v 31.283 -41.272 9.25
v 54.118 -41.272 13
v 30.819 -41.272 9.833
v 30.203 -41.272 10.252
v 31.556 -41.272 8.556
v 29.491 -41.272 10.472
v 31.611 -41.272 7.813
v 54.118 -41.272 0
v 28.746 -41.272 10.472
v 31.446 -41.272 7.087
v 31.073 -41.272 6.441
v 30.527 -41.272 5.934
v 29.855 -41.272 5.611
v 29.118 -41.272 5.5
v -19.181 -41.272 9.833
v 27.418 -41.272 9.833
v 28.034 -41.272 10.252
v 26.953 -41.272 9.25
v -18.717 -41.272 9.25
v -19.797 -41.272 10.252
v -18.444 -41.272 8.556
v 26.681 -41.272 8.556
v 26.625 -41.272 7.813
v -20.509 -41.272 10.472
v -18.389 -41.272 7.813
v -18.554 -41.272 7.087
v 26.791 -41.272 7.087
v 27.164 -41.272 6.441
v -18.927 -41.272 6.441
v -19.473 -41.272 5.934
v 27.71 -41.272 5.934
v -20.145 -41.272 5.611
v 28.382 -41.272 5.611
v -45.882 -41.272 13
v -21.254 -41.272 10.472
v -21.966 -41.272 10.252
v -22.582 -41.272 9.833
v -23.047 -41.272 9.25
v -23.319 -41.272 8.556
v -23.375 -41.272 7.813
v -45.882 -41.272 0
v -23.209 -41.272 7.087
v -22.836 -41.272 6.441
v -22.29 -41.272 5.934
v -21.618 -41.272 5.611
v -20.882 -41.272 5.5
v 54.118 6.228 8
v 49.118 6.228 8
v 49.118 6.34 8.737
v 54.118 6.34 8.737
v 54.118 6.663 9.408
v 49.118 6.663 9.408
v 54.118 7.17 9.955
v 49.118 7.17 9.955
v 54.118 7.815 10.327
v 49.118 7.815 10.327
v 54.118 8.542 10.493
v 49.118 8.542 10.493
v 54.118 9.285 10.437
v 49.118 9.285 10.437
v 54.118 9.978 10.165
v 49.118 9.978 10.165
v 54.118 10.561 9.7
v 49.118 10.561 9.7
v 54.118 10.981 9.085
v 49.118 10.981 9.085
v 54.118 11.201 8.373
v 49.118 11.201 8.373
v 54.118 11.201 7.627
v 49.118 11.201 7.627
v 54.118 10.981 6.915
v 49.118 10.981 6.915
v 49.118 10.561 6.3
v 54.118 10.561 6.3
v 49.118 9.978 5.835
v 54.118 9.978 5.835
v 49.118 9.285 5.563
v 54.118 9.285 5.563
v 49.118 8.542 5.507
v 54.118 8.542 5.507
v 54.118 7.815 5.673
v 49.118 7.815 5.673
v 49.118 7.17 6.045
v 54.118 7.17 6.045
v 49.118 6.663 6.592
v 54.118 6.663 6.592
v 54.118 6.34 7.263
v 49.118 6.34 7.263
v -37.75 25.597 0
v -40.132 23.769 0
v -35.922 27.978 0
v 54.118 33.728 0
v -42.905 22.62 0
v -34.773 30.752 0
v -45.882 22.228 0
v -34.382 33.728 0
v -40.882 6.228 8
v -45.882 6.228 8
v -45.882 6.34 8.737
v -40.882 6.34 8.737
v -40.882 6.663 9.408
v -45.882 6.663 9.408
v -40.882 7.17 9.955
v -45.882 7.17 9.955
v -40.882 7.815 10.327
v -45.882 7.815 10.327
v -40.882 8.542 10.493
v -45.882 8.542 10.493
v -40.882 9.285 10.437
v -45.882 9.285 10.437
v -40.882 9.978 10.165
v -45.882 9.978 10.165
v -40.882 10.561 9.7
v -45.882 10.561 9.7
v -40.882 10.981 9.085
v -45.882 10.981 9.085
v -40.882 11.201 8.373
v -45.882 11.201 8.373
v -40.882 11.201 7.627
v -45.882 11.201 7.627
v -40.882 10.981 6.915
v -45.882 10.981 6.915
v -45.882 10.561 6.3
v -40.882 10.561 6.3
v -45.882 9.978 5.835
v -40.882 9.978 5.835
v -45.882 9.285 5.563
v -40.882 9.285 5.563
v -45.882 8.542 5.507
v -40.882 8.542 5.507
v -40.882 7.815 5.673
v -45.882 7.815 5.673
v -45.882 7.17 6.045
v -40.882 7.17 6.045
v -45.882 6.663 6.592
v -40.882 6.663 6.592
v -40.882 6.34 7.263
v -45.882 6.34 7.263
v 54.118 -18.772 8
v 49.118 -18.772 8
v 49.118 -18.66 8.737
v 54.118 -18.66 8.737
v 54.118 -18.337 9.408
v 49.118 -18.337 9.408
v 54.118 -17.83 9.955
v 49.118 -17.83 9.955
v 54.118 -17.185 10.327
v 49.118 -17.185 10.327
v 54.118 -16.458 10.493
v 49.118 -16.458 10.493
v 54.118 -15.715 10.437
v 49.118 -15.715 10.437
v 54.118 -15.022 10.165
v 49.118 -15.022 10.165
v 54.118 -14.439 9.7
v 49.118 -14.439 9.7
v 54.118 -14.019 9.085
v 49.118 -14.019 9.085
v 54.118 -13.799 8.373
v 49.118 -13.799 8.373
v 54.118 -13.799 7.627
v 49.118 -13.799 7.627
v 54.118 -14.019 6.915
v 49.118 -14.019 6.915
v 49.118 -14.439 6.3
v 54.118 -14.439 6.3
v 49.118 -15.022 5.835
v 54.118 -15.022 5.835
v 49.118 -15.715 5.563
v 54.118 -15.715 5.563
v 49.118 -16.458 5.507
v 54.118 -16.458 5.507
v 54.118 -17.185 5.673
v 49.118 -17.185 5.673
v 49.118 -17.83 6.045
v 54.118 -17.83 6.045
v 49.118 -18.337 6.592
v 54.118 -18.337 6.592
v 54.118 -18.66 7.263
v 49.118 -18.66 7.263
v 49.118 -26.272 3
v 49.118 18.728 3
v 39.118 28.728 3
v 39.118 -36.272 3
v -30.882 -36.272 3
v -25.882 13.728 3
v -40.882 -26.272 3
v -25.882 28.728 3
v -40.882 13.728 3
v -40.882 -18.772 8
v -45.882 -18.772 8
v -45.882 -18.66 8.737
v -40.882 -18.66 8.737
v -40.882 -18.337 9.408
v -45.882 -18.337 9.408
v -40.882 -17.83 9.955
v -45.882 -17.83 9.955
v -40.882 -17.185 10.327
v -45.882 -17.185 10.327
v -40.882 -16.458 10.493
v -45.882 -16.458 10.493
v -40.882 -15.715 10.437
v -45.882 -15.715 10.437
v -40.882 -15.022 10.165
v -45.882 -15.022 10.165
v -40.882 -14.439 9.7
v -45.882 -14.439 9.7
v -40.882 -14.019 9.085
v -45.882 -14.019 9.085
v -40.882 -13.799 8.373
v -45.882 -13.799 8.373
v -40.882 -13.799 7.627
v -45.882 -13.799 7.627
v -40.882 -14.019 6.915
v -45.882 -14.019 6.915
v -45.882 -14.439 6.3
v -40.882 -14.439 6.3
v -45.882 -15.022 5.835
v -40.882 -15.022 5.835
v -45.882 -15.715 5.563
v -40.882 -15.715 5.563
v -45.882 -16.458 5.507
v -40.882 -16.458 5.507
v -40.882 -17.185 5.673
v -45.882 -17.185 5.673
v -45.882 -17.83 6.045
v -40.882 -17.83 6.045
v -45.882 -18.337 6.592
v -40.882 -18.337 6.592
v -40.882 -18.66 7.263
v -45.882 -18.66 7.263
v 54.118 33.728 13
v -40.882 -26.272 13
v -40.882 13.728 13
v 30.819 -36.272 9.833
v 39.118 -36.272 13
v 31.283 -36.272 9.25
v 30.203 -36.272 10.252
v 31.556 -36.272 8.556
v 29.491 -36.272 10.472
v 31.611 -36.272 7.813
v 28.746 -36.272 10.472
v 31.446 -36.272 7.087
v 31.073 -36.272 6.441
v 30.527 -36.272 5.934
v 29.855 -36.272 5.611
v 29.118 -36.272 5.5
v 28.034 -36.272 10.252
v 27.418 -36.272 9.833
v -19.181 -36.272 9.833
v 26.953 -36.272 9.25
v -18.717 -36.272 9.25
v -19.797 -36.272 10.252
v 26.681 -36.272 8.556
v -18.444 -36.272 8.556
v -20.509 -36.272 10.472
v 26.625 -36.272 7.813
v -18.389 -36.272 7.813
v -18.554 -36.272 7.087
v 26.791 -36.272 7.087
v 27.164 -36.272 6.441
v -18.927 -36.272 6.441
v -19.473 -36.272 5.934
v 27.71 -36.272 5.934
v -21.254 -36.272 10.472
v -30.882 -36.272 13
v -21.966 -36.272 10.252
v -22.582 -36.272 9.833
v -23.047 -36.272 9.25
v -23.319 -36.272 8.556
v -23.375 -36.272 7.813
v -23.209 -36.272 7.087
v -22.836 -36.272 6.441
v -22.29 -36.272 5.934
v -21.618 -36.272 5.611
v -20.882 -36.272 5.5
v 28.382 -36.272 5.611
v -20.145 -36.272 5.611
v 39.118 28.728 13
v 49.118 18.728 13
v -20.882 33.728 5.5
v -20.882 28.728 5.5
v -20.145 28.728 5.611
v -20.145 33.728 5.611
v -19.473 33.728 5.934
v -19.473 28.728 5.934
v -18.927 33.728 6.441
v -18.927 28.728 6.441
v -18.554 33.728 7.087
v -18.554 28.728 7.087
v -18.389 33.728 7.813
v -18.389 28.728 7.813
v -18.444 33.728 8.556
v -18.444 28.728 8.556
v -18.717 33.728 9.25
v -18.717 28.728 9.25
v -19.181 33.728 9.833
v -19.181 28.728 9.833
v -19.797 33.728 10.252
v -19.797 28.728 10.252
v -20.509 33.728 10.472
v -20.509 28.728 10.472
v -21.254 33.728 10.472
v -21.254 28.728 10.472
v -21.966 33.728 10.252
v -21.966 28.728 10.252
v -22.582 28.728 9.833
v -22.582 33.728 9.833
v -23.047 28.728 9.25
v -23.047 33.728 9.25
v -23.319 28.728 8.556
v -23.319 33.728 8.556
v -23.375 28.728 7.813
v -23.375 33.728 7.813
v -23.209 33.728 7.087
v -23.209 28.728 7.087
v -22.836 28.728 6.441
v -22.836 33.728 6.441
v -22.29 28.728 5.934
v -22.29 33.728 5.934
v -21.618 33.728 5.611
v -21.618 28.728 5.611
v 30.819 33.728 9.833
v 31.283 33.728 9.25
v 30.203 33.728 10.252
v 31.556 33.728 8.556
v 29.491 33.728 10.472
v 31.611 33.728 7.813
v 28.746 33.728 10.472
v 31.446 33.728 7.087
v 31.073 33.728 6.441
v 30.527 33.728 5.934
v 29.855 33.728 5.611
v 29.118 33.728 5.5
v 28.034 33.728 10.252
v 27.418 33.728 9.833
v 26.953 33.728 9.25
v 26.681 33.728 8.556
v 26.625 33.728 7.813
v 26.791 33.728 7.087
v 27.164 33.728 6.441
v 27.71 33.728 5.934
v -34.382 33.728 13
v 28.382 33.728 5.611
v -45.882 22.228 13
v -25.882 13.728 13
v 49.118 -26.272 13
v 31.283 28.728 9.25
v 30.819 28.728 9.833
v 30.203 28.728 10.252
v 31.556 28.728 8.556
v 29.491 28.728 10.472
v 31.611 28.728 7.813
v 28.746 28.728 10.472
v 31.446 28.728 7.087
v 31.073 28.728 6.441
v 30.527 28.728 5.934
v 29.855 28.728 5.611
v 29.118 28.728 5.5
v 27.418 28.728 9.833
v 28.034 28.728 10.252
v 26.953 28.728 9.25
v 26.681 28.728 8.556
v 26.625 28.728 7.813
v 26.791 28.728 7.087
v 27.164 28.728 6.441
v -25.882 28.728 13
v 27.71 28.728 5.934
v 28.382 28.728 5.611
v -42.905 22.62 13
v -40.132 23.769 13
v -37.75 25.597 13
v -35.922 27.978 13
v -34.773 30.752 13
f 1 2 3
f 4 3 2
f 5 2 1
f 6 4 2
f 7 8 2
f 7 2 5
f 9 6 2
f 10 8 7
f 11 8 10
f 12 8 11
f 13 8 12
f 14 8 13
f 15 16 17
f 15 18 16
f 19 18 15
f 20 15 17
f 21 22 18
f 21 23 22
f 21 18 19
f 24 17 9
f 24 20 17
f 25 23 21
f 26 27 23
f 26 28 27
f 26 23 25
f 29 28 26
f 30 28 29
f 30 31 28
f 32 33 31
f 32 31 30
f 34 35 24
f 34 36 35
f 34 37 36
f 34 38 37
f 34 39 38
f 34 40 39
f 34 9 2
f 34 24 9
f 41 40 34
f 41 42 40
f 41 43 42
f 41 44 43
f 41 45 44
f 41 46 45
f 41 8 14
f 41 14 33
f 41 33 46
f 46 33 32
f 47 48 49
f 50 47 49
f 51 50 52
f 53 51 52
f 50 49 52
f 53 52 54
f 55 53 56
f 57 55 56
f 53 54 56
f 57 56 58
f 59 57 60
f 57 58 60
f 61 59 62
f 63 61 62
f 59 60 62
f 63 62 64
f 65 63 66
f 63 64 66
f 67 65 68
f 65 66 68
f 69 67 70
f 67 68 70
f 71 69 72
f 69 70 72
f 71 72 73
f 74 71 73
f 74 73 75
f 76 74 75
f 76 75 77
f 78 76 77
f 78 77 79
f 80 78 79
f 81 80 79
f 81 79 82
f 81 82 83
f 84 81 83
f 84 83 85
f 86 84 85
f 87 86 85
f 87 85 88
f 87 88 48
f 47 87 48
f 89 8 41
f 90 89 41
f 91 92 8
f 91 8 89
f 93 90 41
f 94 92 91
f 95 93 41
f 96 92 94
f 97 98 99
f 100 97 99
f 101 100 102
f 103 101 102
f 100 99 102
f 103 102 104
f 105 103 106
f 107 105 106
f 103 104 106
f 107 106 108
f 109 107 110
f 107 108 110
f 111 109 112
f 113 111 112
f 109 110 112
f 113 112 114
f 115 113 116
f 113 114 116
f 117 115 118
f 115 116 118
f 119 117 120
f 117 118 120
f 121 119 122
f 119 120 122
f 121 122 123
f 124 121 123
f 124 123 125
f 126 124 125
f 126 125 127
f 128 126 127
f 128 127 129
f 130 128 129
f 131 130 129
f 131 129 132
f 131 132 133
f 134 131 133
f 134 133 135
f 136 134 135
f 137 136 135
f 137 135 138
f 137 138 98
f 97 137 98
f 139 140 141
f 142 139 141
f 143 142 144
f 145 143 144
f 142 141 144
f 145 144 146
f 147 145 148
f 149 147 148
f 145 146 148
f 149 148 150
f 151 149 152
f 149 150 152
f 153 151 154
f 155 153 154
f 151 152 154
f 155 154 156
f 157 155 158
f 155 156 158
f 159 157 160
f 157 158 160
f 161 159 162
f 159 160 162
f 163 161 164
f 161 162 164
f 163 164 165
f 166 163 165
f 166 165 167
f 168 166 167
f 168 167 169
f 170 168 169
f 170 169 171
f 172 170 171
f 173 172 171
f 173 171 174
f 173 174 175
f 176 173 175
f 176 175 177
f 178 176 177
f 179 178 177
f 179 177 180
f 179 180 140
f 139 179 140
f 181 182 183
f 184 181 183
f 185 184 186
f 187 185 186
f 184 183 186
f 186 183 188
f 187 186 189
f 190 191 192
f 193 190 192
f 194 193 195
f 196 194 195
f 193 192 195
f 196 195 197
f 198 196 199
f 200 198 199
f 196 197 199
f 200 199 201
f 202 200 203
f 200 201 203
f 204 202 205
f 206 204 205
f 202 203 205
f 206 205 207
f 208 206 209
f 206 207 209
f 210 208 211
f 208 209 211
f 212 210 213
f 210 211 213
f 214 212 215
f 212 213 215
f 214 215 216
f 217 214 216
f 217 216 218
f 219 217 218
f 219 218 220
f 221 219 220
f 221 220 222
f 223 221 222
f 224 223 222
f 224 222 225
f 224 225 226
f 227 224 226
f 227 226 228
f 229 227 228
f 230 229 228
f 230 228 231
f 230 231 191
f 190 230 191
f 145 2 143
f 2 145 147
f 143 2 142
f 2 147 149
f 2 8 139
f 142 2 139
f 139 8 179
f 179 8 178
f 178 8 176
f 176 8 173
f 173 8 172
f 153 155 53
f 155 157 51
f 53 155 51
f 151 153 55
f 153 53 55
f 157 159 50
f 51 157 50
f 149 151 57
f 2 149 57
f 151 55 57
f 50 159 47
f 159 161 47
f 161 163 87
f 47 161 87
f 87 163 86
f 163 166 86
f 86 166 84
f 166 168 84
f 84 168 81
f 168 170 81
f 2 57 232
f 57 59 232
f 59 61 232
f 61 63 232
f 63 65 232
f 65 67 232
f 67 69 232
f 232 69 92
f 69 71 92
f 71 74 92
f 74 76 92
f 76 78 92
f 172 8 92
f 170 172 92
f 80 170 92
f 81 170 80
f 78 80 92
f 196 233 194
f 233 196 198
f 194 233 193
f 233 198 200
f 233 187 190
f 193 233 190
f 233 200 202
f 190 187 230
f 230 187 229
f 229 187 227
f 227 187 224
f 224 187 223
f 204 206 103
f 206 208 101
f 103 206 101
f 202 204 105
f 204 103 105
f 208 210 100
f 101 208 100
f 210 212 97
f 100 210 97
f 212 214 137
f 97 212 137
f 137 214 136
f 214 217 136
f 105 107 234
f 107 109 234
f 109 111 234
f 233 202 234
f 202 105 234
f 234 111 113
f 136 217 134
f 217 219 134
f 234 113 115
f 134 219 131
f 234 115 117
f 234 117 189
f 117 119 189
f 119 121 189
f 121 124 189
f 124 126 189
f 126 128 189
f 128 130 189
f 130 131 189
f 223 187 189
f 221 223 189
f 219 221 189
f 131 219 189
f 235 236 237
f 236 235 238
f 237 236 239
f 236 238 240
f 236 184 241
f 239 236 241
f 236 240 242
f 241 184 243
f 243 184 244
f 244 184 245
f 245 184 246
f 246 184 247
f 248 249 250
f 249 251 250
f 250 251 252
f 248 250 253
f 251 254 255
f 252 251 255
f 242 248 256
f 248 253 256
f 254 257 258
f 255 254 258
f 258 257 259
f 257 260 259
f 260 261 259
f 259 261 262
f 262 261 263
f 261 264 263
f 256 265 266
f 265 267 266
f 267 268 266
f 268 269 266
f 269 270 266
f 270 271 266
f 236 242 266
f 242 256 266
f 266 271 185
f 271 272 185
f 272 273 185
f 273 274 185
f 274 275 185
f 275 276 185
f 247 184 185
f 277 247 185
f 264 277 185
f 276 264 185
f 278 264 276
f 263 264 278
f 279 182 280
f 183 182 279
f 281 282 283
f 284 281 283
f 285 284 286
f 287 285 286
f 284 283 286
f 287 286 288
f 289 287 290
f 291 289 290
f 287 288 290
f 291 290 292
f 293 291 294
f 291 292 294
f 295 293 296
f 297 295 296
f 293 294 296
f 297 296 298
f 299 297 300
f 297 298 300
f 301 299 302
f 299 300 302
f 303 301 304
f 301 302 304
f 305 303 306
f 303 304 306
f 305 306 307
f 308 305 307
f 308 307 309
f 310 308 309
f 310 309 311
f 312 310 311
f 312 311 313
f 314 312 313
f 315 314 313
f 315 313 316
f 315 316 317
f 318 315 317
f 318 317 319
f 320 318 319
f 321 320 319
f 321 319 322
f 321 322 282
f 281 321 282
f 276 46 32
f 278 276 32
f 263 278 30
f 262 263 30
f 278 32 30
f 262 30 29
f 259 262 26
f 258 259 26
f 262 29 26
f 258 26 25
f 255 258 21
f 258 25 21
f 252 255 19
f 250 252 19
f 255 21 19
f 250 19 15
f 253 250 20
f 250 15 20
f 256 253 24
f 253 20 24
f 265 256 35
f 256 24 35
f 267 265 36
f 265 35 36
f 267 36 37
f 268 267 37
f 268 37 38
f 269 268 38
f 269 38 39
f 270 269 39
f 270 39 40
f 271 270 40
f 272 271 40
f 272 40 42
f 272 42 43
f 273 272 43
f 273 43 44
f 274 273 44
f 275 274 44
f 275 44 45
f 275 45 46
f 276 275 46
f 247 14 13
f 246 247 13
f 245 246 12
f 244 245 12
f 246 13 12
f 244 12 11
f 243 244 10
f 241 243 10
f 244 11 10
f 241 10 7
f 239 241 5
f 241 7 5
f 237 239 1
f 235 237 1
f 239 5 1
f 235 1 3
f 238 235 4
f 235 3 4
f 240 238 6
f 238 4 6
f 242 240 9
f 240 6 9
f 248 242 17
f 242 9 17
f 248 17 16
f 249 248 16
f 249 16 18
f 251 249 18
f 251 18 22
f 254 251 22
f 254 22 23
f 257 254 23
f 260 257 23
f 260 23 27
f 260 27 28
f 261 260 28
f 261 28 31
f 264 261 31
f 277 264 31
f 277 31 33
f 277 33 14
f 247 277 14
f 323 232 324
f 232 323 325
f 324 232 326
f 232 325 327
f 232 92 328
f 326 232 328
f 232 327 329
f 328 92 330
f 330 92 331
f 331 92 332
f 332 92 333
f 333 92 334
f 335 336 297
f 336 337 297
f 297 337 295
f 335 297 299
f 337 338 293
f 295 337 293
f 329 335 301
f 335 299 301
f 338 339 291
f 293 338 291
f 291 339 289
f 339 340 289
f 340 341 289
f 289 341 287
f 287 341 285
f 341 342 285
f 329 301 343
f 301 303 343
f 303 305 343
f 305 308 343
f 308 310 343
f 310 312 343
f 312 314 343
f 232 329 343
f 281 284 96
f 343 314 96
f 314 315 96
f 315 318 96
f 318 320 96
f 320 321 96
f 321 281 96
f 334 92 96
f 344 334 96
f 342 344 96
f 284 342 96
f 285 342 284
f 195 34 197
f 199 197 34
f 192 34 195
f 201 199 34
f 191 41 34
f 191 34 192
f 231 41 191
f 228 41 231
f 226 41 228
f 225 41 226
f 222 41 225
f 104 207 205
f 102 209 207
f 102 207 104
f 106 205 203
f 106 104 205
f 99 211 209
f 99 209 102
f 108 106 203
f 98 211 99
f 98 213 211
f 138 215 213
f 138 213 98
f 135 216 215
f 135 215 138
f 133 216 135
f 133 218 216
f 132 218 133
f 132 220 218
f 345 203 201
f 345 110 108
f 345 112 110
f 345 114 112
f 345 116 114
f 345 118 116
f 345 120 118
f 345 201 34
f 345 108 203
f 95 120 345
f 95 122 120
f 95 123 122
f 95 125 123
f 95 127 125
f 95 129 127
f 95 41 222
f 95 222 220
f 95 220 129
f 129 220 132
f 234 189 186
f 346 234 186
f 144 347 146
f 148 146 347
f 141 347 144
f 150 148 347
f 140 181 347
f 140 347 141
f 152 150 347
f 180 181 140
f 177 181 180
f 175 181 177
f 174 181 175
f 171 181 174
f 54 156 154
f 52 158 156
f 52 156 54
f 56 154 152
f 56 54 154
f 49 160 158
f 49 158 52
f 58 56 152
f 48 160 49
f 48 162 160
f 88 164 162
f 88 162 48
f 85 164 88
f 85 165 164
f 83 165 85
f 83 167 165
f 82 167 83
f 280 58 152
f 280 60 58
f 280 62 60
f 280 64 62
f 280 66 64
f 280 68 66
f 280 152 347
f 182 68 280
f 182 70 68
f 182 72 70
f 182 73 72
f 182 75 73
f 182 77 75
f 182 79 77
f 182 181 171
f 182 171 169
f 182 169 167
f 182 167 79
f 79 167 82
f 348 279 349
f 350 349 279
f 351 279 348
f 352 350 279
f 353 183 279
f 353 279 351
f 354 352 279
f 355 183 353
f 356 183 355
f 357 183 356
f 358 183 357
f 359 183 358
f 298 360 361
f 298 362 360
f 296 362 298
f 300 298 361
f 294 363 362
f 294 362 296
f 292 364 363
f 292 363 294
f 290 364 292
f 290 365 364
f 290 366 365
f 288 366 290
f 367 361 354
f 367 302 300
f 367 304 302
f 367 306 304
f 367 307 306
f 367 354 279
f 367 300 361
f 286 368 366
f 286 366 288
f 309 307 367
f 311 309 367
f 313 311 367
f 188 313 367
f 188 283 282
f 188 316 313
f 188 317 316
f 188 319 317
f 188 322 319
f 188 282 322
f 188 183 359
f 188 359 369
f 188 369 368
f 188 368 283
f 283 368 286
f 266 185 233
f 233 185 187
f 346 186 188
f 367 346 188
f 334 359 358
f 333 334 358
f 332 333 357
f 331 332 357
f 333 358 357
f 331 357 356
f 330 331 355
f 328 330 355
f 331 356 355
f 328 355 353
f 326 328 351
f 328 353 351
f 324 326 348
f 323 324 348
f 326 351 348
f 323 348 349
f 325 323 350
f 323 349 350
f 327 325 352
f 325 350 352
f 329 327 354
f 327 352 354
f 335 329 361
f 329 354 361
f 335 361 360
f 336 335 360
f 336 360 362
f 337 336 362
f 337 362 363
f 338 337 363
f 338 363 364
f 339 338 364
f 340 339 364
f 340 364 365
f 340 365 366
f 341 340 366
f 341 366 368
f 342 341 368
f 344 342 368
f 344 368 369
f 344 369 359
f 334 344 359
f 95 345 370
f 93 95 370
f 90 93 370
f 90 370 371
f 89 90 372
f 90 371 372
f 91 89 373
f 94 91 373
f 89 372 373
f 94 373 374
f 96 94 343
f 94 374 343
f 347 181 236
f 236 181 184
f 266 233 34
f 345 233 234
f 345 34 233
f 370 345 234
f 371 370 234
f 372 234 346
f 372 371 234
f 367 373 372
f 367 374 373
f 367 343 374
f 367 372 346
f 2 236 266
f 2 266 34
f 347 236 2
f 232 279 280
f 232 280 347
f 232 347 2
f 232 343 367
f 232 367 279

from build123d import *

# Parameters (mm, degrees)
BOSS_EXTRU_1_DEPTH        = 13
COQUE1_T                  = -5
COQUE1_THICKNESS_2_FACE_W = 90
COQUE1_THICKNESS_2_FACE_H = 65
COQUE1_THICKNESS_2_DEPTH  = 2
ENL_V_MAT_EXTRU_1_REACH   = 110.96
ESQUISSE2_R               = 2.5
ENL_V_MAT_EXTRU_2_REACH   = 95.396
ESQUISSE3_R               = 2.5
ESQUISSE4_W               = 15
ESQUISSE4_H               = 15
BOSS_EXTRU_2_DEPTH        = 10
ESQUISSE6_R               = 11.5
ENL_V_MAT_EXTRU_4_DEPTH   = 13


with BuildPart() as part:
    # Esquisse1 → Boss.-Extru.1 (new body)
    with BuildSketch(Plane.XY):
        Polygon((44.118436308, 33.728448276), (54.118436308, 33.728448276), (54.118436308, 23.728448276), (54.118436308, -41.271551724), (-45.881563692, -41.271551724), (-45.881563692, 33.728448276), align=None)
    extrude(amount=BOSS_EXTRU_1_DEPTH)

    # Coque1
    coque1_openings = [part.faces().sort_by_distance(p)[0] for p in [
        (4.118436308, -3.771551724, 13),
    ]]
    offset(amount=COQUE1_T, openings=coque1_openings, kind=Kind.INTERSECTION)

    # Coque1 thickness 2 face (on inner face of the shell) → Coque1 thickness 2 (cut)
    with BuildSketch(Plane(origin=(4.118436308, -3.771551724, 5), x_dir=(-1, 0, 0), z_dir=(0, 0, -1))):
        Rectangle(COQUE1_THICKNESS_2_FACE_W, COQUE1_THICKNESS_2_FACE_H)
    extrude(amount=COQUE1_THICKNESS_2_DEPTH, mode=Mode.SUBTRACT)

    # Enlèv. mat.-Extru.1: up to this face of the body (flat: up to its plane)
    enl_v_mat_extru_1_end = Plane(part.part.faces().sort_by_distance((54.118436308, -3.771551724, 6.5))[0])
    # Esquisse2 → Enlèv. mat.-Extru.1 (cut, up to the picked face)
    with BuildSketch(Plane.ZY.offset(45.881563692), mode=Mode.PRIVATE) as enl_v_mat_extru_1_sk1:
        with Locations(Location((8, -16.271551724, 0), (0, 0, 270))):
            Circle(ESQUISSE2_R)
    enl_v_mat_extru_1_tool1 = split(extrude(enl_v_mat_extru_1_sk1.sketch, amount=-ENL_V_MAT_EXTRU_1_REACH, mode=Mode.PRIVATE), bisect_by=enl_v_mat_extru_1_end, keep=Keep.BOTH, mode=Mode.PRIVATE)
    # Esquisse2 → Enlèv. mat.-Extru.1 (cut, up to the picked face)
    with BuildSketch(Plane.ZY.offset(45.881563692), mode=Mode.PRIVATE) as enl_v_mat_extru_1_sk2:
        with Locations(Location((8, 8.728448276, 0), (0, 0, 270))):
            Circle(ESQUISSE2_R)
    enl_v_mat_extru_1_tool2 = split(extrude(enl_v_mat_extru_1_sk2.sketch, amount=-ENL_V_MAT_EXTRU_1_REACH, mode=Mode.PRIVATE), bisect_by=enl_v_mat_extru_1_end, keep=Keep.BOTH, mode=Mode.PRIVATE)
    add(enl_v_mat_extru_1_tool1.solids().sort_by(Axis((-45.881564, -16.271552, 8), (1, 0, 0)))[0], mode=Mode.SUBTRACT)
    add(enl_v_mat_extru_1_tool2.solids().sort_by(Axis((-45.881564, 8.728448, 8), (1, 0, 0)))[0], mode=Mode.SUBTRACT)

    # Enlèv. mat.-Extru.2: up to this face of the body (flat: up to its plane)
    enl_v_mat_extru_2_end = Plane(part.part.faces().sort_by_distance((4.118436308, 33.728448276, 6.5))[0])
    # Esquisse3 → Enlèv. mat.-Extru.2 (cut, up to the picked face)
    with BuildSketch(Plane.XZ.offset(41.271551724), mode=Mode.PRIVATE) as enl_v_mat_extru_2_sk1:
        with Locations(Location((-20.881563692, 8, 0), (0, 0, 270))):
            Circle(ESQUISSE3_R)
    enl_v_mat_extru_2_tool1 = split(extrude(enl_v_mat_extru_2_sk1.sketch, amount=-ENL_V_MAT_EXTRU_2_REACH, mode=Mode.PRIVATE), bisect_by=enl_v_mat_extru_2_end, keep=Keep.BOTH, mode=Mode.PRIVATE)
    # Esquisse3 → Enlèv. mat.-Extru.2 (cut, up to the picked face)
    with BuildSketch(Plane.XZ.offset(41.271551724), mode=Mode.PRIVATE) as enl_v_mat_extru_2_sk2:
        with Locations(Location((29.118436308, 8, 0), (0, 0, 270))):
            Circle(ESQUISSE3_R)
    enl_v_mat_extru_2_tool2 = split(extrude(enl_v_mat_extru_2_sk2.sketch, amount=-ENL_V_MAT_EXTRU_2_REACH, mode=Mode.PRIVATE), bisect_by=enl_v_mat_extru_2_end, keep=Keep.BOTH, mode=Mode.PRIVATE)
    add(enl_v_mat_extru_2_tool1.solids().sort_by(Axis((-20.881564, -41.271552, 8), (0, 1, 0)))[0], mode=Mode.SUBTRACT)
    add(enl_v_mat_extru_2_tool2.solids().sort_by(Axis((29.118436, -41.271552, 8), (0, 1, 0)))[0], mode=Mode.SUBTRACT)

    # Esquisse4 → Boss.-Extru.2 (add)
    with BuildSketch(Plane.XY.offset(3)):
        Polygon((-30.881563692, -36.271551724), (-40.881563692, -26.271551724), (-40.881563692, -36.271551724), align=None)
        Polygon((49.118436308, 28.728448276), (49.118436308, 18.728448276), (39.118436308, 28.728448276), align=None)
        Polygon((49.118436308, -36.271551724), (49.118436308, -26.271551724), (39.118436308, -36.271551724), align=None)
        with Locations((-33.381563692, 21.228448276)):
            Rectangle(ESQUISSE4_W, ESQUISSE4_H)
    extrude(amount=BOSS_EXTRU_2_DEPTH)

    # Esquisse6 → Enlèv. mat.-Extru.4 (cut)
    with BuildSketch(Plane.XY.offset(13)):
        with Locations((-45.881563692, 33.728448276)):
            Circle(ESQUISSE6_R)
    extrude(amount=-ENL_V_MAT_EXTRU_4_DEPTH, mode=Mode.SUBTRACT)


solid = part.part
